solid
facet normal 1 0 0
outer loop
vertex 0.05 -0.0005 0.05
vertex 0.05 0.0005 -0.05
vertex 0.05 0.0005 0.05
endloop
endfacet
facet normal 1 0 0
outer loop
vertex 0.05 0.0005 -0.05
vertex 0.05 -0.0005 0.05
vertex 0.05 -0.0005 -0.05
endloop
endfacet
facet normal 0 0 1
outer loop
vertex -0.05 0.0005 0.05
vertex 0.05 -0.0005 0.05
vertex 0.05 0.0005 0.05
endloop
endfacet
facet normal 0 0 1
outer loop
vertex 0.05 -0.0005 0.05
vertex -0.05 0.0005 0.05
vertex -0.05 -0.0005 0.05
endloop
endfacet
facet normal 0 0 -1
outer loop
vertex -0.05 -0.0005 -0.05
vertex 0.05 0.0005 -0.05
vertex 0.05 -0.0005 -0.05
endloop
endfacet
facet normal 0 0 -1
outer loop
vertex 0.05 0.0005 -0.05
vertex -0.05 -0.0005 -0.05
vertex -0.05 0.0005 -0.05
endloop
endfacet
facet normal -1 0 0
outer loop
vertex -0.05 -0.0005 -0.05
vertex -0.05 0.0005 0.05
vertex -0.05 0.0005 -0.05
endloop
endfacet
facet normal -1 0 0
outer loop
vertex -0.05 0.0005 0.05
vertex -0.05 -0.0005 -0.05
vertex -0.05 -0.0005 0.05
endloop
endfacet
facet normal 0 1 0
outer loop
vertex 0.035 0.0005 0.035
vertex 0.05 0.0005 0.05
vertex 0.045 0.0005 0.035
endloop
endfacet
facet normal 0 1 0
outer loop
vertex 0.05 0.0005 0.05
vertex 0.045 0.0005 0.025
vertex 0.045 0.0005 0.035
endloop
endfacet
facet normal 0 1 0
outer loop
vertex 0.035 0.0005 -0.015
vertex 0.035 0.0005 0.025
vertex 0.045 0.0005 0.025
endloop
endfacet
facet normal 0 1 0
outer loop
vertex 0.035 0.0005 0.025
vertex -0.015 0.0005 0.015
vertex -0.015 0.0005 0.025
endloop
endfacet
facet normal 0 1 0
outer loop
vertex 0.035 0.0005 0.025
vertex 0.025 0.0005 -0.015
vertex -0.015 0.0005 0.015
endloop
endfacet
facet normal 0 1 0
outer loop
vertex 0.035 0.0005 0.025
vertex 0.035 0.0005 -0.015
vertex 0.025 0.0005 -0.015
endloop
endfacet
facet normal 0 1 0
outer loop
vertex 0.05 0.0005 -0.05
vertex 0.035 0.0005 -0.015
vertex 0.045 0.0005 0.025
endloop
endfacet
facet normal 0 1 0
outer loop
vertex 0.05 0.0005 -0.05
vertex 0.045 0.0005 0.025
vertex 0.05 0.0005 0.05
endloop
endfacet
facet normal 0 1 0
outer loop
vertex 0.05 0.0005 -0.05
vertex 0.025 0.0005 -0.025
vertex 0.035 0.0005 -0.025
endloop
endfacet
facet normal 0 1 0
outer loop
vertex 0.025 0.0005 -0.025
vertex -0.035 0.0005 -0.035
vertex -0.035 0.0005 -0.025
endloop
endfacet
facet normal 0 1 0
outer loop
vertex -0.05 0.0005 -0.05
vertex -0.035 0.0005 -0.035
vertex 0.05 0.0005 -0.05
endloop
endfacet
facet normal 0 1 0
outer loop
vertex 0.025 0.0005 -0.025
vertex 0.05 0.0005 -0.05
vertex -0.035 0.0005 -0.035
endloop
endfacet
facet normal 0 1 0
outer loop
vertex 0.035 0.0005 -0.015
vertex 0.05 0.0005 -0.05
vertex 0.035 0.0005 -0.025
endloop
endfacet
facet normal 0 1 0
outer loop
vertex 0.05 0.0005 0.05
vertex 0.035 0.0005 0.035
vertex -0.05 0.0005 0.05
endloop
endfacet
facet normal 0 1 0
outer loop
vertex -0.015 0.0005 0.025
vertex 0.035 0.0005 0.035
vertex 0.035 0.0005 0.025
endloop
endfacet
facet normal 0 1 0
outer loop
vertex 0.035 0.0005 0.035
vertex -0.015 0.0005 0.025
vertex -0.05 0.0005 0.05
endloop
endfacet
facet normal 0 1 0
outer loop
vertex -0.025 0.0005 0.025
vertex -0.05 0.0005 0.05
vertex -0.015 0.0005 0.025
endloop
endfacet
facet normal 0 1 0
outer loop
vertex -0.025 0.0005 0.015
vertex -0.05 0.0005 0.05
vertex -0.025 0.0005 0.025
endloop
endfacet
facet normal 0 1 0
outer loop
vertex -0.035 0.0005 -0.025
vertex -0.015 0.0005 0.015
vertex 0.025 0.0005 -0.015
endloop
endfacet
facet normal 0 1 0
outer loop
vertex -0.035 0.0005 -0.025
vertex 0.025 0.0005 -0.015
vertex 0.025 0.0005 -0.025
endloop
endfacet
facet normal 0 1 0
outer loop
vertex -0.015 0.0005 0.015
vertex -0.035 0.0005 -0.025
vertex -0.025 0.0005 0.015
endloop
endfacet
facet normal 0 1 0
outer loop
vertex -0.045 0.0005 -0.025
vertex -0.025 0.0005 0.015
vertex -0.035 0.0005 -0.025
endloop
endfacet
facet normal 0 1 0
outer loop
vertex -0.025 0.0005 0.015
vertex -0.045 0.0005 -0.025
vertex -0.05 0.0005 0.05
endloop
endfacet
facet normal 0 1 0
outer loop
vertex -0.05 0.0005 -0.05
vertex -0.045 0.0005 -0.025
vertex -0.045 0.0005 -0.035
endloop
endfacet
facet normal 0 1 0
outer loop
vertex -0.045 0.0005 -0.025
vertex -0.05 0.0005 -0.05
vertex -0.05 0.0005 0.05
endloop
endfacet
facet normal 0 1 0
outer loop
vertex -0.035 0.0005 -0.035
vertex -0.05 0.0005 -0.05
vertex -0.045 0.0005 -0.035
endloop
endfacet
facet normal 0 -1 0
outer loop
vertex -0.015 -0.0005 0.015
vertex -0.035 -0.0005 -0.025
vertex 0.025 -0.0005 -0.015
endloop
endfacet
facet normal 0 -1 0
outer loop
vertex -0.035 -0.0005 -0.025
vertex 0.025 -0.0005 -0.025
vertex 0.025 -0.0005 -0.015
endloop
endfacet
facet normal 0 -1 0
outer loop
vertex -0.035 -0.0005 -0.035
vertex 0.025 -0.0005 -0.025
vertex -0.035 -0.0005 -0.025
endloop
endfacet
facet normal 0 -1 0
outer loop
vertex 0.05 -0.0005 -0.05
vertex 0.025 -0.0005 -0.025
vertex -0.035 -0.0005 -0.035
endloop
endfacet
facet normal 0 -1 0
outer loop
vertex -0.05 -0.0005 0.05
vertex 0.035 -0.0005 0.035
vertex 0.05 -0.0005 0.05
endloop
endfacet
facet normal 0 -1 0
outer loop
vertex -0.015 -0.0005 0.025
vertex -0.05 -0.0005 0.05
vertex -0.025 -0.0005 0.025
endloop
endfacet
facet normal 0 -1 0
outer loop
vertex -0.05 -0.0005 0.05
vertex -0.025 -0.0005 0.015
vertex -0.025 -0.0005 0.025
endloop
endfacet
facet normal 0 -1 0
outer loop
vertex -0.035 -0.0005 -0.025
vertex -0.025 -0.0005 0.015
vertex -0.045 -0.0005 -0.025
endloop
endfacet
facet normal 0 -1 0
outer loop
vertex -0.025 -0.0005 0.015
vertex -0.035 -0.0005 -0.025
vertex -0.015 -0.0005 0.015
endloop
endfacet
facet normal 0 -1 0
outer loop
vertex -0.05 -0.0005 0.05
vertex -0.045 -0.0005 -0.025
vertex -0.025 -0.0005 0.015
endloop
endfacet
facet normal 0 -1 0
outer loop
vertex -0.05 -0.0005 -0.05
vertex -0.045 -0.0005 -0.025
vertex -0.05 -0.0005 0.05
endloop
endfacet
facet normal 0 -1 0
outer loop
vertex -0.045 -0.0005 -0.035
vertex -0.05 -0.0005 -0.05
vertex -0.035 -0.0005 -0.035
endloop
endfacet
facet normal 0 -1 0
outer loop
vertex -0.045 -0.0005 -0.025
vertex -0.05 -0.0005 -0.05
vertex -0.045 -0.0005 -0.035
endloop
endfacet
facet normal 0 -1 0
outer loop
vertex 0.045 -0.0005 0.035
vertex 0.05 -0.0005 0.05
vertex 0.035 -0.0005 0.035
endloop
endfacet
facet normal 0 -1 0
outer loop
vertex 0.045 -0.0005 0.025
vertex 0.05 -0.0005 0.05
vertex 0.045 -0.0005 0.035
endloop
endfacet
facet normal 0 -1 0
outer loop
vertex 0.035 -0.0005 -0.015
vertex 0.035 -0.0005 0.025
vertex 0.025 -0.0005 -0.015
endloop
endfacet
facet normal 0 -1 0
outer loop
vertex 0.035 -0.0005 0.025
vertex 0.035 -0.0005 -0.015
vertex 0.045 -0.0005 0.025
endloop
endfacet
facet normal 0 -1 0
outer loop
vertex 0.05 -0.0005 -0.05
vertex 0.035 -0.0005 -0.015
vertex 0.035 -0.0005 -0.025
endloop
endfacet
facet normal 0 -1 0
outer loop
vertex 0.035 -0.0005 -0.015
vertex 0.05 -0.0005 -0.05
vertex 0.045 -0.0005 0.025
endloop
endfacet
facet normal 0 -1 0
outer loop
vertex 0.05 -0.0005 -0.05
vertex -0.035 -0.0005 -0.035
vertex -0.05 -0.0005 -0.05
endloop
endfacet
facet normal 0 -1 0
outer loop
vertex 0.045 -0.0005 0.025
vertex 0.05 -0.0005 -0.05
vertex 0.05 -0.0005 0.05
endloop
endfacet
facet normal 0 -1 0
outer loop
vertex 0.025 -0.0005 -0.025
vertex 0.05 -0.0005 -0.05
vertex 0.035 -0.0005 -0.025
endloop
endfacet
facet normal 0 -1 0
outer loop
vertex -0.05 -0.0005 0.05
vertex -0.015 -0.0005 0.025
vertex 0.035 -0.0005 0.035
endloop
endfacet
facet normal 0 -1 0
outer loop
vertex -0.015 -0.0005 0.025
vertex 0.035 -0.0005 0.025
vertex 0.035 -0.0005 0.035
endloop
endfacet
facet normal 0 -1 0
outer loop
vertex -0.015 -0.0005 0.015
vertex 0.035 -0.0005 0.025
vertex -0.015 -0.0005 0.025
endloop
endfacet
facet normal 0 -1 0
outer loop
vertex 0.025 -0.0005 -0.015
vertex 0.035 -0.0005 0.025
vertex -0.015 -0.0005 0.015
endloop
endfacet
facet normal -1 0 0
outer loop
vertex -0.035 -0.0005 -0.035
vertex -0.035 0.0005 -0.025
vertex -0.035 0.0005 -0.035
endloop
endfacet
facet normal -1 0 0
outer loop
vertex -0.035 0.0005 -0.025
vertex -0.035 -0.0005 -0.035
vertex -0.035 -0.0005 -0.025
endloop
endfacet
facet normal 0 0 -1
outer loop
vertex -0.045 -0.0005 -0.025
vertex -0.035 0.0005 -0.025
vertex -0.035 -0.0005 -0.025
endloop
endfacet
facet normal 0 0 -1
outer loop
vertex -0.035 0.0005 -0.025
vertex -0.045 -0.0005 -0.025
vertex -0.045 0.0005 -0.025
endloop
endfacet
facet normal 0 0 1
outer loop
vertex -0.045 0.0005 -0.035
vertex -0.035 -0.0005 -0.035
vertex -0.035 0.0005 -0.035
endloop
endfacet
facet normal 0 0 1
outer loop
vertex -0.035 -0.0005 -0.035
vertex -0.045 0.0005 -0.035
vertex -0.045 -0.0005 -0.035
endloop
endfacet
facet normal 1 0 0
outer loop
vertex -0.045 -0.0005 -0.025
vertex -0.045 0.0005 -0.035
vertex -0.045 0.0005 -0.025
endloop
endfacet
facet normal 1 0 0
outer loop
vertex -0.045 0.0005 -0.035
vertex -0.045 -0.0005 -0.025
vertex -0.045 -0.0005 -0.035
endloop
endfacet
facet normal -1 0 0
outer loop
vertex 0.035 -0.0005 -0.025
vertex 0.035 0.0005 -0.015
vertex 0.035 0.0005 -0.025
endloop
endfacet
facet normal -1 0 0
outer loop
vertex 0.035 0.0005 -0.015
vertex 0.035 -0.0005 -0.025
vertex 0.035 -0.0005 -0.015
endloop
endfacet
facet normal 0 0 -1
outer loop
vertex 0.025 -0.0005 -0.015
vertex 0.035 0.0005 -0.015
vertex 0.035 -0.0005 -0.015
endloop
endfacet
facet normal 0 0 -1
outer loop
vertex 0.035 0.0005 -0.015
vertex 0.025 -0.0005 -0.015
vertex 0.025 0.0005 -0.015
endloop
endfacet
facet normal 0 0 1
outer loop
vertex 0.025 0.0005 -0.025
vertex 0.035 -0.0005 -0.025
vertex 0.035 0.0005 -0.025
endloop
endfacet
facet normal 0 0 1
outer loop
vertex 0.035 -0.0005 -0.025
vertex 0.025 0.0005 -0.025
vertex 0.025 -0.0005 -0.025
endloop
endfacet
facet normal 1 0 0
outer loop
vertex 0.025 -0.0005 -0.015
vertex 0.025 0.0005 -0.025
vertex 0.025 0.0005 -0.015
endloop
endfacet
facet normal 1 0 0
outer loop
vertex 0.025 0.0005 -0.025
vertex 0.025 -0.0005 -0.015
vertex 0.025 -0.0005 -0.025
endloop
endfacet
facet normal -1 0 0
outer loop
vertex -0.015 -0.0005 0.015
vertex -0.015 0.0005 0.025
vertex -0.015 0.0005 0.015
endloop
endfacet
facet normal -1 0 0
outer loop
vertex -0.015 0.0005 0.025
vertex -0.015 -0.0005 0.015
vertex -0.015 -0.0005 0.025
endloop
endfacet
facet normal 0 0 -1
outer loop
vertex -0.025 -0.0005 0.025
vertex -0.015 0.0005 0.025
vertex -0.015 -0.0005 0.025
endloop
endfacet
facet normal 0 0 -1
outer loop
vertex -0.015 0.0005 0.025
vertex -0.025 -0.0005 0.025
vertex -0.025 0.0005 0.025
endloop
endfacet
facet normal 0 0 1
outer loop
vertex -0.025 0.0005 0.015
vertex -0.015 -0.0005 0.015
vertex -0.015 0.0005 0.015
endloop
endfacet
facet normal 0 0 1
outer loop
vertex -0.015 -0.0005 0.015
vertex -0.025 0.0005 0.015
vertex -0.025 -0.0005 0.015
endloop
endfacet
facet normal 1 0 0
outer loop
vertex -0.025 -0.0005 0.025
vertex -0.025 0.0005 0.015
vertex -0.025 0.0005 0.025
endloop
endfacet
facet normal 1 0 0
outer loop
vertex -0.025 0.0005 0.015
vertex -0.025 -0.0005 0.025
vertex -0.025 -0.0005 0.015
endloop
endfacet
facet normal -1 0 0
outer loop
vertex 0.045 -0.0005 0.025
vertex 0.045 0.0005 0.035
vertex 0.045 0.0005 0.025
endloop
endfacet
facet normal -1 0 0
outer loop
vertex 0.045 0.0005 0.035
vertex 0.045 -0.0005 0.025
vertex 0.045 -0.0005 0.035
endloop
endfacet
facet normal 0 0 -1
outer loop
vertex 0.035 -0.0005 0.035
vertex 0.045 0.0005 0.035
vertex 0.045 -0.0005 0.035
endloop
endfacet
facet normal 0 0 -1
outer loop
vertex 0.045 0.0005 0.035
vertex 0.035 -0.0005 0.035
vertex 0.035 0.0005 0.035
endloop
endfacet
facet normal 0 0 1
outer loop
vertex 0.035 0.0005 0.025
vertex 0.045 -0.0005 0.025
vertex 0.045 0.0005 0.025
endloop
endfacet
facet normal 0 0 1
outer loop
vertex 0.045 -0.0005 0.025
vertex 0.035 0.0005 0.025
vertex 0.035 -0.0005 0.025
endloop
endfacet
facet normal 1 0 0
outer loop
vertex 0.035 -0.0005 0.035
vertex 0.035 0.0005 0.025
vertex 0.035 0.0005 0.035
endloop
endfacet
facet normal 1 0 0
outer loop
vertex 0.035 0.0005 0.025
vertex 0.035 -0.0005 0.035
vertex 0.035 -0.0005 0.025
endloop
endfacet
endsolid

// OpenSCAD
module boss() {
    cube([0.01, 0.01, 0.01], center=true);
}

module panel_with_bosses() {
    difference() {
        cube([0.1, 0.001, 0.1], center=true);
        translate([-0.04, 0.0005, -0.03]) boss();
        translate([0.03, 0.0005, -0.02]) boss();
        translate([-0.02, 0.0005, 0.02]) boss();
        translate([0.04, 0.0005, 0.03]) boss();
    }
}

panel_with_bosses();
